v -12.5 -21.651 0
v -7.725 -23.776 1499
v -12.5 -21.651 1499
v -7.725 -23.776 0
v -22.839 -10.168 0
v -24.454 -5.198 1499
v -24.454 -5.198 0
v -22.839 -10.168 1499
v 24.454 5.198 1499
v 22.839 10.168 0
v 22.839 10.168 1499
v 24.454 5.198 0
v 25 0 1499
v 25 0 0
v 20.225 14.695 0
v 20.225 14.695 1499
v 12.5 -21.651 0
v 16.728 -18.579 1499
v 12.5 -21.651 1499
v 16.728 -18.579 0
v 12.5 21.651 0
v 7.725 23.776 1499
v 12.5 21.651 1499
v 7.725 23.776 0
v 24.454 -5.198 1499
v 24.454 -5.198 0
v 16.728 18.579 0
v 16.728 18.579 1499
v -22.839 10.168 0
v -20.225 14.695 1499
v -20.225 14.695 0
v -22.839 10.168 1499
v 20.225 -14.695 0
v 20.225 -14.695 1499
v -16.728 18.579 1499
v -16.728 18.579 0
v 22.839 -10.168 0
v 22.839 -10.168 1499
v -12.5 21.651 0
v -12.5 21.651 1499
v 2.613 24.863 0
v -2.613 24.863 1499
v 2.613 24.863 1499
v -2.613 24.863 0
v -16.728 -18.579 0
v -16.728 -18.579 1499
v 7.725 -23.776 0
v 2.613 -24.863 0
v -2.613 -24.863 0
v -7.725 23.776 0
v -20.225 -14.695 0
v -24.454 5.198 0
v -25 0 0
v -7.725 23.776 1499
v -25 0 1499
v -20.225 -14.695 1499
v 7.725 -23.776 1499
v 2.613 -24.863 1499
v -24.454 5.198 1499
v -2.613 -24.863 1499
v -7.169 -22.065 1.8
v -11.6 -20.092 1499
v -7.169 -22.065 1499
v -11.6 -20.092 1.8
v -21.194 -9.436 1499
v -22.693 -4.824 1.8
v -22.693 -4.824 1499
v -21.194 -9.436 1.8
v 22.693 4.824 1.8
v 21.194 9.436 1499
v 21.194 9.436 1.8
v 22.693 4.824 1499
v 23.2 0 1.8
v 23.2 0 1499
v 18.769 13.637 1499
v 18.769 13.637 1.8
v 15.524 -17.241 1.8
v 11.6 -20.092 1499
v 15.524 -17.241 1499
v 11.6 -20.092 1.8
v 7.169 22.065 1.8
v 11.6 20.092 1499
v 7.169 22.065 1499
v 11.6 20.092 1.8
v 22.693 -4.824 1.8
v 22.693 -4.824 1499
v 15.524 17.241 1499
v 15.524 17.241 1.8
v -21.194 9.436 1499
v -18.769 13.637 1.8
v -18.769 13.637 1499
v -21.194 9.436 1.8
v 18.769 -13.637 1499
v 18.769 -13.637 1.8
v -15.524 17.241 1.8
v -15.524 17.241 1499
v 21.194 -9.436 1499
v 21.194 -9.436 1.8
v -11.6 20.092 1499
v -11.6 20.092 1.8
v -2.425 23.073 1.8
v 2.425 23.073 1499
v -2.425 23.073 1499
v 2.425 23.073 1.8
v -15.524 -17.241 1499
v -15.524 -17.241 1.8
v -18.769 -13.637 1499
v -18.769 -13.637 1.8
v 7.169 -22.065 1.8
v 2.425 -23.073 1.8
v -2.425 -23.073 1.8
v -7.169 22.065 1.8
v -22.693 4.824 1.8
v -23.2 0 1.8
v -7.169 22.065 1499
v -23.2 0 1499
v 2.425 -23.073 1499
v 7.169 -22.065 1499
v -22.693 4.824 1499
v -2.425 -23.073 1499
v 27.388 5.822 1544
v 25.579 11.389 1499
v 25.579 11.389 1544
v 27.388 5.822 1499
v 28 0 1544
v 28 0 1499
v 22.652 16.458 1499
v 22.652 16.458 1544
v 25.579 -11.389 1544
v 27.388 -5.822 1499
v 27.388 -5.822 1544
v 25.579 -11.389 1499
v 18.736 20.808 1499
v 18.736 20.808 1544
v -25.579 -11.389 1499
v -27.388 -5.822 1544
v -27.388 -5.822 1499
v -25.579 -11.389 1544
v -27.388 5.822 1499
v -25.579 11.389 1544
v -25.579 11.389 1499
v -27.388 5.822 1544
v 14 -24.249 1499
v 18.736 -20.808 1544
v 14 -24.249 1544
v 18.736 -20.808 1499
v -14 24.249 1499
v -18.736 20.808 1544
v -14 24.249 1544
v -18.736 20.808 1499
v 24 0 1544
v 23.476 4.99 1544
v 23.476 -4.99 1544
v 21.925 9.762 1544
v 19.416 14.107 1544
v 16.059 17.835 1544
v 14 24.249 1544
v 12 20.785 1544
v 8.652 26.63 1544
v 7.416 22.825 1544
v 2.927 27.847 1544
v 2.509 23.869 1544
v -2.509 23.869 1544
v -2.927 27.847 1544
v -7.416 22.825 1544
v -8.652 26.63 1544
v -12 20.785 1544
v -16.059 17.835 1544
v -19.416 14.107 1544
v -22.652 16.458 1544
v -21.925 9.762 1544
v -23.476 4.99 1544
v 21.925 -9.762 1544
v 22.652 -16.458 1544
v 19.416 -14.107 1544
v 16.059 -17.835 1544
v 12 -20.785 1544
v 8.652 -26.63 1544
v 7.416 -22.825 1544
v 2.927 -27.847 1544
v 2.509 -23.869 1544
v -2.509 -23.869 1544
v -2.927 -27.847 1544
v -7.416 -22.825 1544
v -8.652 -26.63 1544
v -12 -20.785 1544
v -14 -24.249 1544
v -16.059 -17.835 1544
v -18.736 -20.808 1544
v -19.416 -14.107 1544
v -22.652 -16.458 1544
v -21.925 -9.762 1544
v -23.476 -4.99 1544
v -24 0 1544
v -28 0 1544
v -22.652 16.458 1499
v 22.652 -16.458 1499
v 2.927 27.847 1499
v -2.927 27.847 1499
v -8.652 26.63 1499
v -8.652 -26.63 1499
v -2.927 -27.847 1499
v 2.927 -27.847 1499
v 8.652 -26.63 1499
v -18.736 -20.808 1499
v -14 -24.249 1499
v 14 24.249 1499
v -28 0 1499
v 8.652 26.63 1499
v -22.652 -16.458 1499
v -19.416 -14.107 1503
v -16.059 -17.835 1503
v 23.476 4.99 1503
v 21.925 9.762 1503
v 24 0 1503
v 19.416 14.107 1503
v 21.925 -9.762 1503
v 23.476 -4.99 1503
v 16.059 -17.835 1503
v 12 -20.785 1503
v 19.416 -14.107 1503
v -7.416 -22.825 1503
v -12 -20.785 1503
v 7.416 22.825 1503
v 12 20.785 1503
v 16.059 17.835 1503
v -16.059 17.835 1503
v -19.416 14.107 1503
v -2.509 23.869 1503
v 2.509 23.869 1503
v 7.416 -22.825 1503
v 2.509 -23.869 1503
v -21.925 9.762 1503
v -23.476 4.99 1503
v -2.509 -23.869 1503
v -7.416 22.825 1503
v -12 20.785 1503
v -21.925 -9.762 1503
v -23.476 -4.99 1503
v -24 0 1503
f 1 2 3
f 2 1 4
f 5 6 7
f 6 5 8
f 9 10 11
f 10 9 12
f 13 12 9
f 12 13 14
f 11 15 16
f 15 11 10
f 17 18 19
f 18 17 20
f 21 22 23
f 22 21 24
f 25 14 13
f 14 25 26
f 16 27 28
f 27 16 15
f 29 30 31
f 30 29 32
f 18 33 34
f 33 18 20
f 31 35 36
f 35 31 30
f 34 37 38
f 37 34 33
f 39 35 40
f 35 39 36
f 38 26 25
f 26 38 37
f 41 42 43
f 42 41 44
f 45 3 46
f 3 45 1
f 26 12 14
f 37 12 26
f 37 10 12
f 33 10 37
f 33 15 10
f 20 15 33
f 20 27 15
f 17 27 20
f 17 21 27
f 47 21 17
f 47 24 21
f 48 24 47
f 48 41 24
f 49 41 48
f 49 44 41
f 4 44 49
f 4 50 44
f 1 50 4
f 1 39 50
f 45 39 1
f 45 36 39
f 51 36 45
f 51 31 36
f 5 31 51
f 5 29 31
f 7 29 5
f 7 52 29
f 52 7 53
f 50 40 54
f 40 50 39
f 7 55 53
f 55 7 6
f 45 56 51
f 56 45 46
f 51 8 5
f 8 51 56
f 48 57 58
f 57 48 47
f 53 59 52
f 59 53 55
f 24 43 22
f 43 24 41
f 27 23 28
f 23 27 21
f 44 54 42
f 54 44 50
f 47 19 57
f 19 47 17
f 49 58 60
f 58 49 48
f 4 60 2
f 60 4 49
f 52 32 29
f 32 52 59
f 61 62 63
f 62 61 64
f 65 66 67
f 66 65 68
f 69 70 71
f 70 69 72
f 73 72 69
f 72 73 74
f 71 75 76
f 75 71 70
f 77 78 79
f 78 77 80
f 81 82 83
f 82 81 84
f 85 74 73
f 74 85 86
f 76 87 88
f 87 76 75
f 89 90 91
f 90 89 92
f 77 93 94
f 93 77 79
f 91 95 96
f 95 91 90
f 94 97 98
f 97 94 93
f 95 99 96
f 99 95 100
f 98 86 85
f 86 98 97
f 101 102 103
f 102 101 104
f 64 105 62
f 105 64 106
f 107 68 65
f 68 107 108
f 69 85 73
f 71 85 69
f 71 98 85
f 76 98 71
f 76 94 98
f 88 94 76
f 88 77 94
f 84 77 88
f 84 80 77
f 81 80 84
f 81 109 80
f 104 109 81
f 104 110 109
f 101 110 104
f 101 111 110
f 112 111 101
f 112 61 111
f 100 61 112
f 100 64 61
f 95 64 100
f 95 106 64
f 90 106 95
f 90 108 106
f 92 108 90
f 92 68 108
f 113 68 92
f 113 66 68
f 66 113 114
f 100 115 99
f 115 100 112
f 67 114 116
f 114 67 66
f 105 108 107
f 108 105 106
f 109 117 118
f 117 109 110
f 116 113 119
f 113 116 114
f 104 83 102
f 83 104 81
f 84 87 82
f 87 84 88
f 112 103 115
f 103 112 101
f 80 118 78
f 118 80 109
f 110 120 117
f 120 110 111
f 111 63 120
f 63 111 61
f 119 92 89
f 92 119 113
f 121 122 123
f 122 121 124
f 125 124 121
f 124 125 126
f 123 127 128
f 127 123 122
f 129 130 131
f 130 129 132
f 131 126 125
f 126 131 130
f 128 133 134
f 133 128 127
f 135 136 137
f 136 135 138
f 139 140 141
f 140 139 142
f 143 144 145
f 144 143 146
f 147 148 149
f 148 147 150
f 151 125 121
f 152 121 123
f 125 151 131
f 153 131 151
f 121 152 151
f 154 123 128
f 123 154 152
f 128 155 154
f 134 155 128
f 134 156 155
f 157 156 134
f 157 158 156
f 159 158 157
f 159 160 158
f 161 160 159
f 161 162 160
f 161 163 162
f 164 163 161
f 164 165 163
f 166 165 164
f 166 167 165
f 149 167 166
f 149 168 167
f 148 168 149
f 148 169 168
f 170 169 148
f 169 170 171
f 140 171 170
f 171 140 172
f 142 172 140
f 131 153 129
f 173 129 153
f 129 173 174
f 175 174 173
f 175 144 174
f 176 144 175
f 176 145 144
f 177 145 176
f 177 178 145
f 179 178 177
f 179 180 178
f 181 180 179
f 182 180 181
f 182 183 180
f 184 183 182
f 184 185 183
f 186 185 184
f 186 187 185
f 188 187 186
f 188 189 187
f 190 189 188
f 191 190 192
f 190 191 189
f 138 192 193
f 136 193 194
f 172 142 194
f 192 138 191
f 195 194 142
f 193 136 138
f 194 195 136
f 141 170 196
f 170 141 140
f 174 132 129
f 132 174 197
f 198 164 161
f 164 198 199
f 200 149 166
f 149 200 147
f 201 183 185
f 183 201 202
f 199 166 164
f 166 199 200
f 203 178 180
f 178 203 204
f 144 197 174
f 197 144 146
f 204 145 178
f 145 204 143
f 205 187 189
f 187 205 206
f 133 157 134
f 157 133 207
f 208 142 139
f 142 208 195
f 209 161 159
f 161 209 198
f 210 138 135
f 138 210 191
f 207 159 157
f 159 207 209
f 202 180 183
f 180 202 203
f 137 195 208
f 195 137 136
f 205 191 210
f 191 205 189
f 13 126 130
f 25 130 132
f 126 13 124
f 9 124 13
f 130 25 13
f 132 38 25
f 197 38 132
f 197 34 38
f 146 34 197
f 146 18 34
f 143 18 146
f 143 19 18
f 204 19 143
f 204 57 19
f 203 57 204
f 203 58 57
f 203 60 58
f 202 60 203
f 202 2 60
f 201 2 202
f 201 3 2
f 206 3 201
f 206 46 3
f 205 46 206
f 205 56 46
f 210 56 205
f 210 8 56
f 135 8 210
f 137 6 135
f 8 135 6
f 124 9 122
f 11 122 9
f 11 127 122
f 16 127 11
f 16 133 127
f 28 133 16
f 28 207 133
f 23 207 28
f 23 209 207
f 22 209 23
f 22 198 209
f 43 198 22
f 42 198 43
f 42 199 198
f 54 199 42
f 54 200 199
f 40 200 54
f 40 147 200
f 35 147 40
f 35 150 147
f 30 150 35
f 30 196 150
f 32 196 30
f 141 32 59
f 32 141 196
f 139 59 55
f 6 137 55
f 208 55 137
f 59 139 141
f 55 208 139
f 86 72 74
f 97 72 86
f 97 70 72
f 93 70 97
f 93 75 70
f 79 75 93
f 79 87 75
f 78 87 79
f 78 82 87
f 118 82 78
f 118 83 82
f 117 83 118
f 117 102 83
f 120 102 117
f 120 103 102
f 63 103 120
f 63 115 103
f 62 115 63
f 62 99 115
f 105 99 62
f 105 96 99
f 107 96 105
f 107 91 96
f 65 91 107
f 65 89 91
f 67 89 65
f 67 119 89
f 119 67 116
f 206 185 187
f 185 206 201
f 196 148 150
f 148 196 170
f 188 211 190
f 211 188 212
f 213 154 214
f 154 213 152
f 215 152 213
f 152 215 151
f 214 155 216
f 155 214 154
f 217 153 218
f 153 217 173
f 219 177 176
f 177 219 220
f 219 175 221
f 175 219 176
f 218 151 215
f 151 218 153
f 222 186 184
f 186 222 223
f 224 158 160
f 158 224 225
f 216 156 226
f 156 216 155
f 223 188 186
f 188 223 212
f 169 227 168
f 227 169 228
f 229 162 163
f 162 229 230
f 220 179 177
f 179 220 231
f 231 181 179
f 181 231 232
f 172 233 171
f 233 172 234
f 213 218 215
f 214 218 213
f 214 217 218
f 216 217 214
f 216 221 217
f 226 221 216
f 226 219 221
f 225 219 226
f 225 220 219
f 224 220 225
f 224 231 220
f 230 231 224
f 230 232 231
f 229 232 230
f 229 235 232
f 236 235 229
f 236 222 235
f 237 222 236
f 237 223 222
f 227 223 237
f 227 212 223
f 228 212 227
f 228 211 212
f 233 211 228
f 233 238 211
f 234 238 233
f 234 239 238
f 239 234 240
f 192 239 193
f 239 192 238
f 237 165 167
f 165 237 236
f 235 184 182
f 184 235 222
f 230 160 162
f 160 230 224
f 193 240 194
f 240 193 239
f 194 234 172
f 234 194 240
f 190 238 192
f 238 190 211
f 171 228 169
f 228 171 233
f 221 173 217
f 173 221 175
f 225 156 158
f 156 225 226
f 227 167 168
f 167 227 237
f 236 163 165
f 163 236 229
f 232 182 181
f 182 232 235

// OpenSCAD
// Parameters
pipe_standard = 1; //[1:1:1]
nominal_size = 50; //[25:100:1]
length_mm = 1500; //[750:3000:10]
ht50_outer_diameter = 50; //[40:60:0.5]
ht50_wall_thickness = 1.8; //[1.0:3.6:0.1]
fitting_length = 45; //[25:90:1]
fitting_outer_diameter = 56; //[50:80:0.5]
fitting_wall_extra = 2.2; //[1.0:5.0:0.1]
fitting_stop_ring_length = 6; //[2:15:1]
fitting_stop_ring_thickness = 1.2; //[0.5:3.0:0.1]
overlap = 1; //[0.5:2:0.1]

// HT Pipe - complete geometry
module ht_pipe() {
  color([0.85, 0.85, 0.8]) {
    // Pipe body
    difference() {
      cylinder(h=length_mm, r=ht50_outer_diameter/2, center=false);
      translate([0, 0, ht50_wall_thickness])
        cylinder(h=length_mm, r=ht50_outer_diameter/2 - ht50_wall_thickness, center=false);
    }
    
    // End fitting
    translate([0, 0, length_mm - overlap]) {
      difference() {
        cylinder(h=fitting_length, r=fitting_outer_diameter/2, center=false);
        translate([0, 0, ht50_wall_thickness + fitting_wall_extra])
          cylinder(h=fitting_length, r=fitting_outer_diameter/2 - (ht50_wall_thickness + fitting_wall_extra), center=false);
        translate([0, 0, fitting_length - fitting_stop_ring_length])
          cylinder(h=fitting_stop_ring_length, r=ht50_outer_diameter/2 - ht50_wall_thickness - fitting_stop_ring_thickness, center=false);
      }
    }
  }
}

// Assembly
module assembly() {
  ht_pipe();
}

assembly();
